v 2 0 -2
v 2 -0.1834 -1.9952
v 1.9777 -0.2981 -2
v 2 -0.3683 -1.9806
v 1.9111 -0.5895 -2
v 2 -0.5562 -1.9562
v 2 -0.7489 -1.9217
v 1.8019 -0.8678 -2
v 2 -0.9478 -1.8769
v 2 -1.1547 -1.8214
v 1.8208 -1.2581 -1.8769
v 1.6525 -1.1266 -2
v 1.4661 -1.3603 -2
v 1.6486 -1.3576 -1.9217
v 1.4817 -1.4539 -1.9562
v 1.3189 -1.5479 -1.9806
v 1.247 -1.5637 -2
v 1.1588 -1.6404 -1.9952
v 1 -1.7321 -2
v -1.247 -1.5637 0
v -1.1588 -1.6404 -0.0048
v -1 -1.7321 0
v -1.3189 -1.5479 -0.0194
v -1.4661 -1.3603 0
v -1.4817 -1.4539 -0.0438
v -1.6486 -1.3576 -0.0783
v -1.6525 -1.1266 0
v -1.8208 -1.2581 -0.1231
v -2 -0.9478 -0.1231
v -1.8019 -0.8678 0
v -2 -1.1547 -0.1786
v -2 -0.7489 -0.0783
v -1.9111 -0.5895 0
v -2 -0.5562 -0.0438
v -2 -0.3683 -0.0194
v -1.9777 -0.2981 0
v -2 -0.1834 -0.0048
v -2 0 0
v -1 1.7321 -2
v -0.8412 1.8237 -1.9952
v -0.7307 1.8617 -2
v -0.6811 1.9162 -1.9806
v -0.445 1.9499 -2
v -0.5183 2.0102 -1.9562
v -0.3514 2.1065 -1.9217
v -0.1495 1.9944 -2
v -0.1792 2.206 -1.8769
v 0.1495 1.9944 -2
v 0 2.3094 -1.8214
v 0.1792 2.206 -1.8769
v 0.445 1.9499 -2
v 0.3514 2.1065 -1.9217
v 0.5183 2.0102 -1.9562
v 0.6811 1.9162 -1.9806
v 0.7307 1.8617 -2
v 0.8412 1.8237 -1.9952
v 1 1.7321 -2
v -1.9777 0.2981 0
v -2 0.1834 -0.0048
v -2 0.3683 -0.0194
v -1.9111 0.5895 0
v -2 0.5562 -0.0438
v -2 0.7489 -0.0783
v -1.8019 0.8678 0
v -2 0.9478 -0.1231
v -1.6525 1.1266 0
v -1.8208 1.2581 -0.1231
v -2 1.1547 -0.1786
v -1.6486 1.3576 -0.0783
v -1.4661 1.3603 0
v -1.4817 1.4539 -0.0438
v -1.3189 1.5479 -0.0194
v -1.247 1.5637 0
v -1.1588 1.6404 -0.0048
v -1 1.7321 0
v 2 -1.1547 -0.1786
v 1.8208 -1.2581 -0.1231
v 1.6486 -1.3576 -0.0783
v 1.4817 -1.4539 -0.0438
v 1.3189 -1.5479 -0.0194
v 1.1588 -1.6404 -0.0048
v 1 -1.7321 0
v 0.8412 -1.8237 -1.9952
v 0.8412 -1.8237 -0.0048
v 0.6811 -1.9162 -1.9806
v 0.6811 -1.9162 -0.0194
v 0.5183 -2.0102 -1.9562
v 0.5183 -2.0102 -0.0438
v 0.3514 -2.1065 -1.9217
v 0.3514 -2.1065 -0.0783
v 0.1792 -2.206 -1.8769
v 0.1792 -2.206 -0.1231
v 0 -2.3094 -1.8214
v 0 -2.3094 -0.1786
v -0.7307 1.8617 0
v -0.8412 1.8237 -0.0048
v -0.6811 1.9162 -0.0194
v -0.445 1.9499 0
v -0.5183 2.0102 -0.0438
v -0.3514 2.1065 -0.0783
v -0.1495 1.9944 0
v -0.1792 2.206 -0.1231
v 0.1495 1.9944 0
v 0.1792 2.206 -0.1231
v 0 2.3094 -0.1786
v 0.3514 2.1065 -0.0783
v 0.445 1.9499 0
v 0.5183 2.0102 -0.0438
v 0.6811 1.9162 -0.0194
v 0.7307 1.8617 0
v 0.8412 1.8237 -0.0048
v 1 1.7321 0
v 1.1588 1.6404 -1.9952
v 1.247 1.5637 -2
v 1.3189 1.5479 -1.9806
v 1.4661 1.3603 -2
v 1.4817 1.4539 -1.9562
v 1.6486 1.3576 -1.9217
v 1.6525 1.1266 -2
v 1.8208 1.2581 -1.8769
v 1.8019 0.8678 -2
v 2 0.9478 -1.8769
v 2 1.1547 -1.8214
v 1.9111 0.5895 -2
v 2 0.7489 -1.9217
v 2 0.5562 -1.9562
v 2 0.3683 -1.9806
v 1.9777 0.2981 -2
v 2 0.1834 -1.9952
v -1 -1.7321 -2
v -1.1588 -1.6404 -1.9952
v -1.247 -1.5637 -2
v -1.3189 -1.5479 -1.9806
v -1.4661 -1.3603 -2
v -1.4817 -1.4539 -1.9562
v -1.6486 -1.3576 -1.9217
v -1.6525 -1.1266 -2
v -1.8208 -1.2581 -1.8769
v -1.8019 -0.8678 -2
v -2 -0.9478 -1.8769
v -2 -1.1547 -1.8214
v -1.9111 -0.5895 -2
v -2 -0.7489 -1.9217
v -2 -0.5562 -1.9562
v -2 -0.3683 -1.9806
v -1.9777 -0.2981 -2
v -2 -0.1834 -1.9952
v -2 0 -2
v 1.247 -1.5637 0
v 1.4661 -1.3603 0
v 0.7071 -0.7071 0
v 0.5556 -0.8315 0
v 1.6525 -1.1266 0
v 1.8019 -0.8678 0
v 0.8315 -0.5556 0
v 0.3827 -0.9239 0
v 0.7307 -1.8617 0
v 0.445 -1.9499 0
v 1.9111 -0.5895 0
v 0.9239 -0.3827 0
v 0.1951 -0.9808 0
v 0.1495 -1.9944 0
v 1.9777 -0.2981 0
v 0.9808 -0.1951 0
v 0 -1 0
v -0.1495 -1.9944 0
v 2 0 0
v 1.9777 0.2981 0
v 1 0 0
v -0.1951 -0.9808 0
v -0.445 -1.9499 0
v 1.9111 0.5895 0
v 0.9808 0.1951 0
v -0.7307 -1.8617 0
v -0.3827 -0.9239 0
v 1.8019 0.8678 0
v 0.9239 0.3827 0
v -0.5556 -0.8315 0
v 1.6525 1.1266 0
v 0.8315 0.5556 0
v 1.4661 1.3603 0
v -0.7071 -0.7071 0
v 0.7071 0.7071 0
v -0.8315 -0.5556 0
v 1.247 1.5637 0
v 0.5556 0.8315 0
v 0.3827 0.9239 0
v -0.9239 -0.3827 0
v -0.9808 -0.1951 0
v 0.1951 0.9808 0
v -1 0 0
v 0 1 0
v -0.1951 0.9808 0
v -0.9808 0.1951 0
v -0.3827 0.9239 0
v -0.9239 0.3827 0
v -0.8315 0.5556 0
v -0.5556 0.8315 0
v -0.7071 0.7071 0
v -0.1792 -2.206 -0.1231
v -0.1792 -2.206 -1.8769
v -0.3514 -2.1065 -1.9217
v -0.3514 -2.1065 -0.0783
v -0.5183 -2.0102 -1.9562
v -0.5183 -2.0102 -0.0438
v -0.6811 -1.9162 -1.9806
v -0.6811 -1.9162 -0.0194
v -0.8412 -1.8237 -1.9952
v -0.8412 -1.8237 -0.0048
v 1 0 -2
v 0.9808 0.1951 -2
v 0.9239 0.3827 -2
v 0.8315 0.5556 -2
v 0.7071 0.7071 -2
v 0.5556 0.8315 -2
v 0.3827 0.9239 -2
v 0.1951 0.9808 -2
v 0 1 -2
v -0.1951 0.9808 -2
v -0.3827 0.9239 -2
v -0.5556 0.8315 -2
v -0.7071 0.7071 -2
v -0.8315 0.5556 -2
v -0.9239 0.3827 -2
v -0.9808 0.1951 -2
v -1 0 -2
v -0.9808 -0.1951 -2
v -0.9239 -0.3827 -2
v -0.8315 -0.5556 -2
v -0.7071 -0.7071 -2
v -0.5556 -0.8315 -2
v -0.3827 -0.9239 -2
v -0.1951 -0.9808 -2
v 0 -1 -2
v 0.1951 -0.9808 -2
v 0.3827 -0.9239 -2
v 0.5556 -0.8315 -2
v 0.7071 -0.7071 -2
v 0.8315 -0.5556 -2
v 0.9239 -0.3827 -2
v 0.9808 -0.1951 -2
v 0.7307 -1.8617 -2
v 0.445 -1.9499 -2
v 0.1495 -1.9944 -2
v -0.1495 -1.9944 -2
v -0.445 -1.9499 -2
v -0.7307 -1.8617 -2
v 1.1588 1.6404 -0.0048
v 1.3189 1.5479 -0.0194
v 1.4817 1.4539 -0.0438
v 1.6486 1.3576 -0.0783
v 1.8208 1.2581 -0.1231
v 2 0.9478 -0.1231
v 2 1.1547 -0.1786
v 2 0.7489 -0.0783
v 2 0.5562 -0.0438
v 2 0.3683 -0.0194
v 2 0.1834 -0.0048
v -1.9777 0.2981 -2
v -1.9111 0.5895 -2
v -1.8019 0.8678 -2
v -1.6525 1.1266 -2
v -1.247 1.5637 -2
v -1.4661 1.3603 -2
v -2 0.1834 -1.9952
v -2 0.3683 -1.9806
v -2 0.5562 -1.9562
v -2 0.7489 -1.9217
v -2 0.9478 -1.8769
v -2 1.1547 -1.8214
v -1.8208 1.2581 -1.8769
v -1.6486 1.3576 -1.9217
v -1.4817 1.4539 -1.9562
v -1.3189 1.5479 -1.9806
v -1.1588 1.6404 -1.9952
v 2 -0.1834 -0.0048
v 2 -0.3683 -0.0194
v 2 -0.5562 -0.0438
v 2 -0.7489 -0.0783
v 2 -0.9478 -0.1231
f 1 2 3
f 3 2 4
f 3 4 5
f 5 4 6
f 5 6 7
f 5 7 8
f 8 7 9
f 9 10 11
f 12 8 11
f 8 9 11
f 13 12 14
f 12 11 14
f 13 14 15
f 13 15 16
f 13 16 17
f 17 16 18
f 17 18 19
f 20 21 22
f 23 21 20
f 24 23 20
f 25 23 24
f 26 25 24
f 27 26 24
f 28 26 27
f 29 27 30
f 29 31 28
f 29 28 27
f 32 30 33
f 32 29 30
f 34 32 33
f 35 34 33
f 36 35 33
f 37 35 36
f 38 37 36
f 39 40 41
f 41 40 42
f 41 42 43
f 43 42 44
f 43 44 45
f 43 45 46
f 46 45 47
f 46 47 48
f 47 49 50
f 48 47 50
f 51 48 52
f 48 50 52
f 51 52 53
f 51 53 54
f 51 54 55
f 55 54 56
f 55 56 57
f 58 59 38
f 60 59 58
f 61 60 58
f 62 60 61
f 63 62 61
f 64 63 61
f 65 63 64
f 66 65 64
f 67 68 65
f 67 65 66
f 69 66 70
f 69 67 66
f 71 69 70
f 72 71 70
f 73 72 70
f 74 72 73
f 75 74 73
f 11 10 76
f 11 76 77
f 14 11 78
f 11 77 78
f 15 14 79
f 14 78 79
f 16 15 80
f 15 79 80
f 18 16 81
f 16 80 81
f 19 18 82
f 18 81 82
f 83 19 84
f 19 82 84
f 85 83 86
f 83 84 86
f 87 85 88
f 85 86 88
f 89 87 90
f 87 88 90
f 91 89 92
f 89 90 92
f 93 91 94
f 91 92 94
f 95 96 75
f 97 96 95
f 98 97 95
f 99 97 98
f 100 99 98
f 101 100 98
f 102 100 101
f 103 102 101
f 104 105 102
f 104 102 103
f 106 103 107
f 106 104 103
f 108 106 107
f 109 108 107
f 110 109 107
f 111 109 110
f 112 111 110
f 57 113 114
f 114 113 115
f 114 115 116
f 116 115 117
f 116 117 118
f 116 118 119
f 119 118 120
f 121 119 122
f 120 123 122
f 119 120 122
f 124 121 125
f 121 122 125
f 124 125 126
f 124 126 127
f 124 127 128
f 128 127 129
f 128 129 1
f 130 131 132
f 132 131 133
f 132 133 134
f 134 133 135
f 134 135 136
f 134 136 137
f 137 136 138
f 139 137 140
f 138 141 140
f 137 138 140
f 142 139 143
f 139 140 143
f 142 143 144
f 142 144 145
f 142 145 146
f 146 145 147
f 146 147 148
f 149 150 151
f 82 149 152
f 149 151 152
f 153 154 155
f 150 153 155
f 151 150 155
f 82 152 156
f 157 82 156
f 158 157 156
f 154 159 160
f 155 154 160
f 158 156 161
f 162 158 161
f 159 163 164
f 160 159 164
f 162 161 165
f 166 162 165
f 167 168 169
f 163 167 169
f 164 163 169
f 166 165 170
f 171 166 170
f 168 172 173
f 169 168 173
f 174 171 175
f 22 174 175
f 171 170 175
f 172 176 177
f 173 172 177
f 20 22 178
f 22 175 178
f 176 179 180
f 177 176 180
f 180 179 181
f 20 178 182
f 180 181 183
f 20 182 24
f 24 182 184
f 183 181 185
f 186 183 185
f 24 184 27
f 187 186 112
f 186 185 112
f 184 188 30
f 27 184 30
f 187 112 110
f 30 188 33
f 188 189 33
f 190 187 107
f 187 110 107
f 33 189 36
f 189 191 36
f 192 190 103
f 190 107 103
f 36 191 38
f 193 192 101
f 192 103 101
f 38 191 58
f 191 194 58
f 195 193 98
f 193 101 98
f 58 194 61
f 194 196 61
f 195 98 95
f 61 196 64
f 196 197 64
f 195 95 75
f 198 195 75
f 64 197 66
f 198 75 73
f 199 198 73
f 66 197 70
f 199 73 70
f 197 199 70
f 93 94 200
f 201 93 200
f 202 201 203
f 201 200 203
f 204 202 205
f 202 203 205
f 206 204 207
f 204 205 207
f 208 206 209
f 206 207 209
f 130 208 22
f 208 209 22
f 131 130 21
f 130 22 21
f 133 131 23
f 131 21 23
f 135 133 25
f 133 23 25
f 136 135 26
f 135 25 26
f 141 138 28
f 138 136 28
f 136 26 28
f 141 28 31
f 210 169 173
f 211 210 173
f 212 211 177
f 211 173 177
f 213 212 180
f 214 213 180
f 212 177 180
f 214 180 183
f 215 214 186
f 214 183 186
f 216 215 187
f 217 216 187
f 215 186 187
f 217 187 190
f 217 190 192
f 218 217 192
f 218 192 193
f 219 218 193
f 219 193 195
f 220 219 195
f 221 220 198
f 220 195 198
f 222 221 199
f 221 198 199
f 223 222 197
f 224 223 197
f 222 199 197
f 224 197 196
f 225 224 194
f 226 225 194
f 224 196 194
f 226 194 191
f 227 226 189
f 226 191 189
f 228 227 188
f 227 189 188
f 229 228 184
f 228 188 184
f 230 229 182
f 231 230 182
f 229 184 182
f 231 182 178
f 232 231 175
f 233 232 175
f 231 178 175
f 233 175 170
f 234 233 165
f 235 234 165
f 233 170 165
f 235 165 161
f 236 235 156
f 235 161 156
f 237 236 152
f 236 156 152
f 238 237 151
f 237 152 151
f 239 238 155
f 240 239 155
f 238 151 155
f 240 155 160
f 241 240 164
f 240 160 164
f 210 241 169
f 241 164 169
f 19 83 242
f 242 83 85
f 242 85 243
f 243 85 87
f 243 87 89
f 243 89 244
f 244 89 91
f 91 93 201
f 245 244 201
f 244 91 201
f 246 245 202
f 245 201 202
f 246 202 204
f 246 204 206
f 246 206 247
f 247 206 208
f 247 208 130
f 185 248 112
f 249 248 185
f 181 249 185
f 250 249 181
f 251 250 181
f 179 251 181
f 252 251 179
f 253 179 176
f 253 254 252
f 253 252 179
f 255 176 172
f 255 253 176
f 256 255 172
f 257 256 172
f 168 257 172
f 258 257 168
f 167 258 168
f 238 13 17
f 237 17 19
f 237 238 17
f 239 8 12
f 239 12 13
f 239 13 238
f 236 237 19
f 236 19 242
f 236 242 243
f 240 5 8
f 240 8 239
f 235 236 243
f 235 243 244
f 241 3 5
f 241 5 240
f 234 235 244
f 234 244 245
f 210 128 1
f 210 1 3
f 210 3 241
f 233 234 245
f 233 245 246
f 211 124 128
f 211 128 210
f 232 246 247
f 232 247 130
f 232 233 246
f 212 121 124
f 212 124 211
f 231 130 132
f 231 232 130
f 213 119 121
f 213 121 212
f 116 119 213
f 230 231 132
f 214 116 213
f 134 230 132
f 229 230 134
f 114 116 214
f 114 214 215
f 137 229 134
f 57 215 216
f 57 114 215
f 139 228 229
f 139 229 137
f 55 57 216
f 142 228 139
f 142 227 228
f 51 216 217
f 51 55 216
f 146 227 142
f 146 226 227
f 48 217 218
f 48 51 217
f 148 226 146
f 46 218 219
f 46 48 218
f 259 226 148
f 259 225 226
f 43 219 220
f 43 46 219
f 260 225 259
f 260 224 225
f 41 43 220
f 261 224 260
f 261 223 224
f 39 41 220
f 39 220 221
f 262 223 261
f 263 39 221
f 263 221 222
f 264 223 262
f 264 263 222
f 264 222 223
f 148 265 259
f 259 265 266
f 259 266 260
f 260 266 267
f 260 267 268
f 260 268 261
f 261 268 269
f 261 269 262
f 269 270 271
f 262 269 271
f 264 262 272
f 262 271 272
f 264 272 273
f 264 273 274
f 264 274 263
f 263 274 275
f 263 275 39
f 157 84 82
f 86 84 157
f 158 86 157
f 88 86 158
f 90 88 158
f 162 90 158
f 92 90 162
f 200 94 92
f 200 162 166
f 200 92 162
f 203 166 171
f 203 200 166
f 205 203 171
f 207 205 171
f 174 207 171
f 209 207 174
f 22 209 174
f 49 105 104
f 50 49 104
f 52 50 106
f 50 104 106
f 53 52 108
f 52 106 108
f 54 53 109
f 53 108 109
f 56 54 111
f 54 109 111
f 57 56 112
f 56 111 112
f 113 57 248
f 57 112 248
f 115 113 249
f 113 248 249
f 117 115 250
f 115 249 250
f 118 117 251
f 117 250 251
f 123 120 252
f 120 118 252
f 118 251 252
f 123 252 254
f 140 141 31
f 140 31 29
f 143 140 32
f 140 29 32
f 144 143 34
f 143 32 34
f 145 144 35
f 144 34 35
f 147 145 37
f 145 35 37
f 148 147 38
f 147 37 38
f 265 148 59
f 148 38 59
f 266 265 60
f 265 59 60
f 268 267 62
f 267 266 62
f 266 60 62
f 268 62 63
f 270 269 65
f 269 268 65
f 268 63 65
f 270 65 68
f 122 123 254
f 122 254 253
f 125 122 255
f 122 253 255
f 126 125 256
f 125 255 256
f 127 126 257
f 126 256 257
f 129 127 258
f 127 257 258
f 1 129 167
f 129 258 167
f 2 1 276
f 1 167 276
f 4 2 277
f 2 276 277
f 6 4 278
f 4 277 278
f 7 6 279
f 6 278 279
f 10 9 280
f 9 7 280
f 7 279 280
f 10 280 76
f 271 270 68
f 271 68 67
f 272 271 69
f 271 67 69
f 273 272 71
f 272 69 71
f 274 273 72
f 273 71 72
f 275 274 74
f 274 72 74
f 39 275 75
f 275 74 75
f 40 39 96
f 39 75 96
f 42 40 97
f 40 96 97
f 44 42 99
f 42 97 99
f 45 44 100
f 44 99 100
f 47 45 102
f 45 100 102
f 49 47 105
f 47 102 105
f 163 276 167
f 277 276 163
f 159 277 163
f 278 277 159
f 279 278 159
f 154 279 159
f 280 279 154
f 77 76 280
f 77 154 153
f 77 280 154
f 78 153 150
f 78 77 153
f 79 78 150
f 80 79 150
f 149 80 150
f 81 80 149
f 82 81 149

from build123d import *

# Parameters (mm, degrees)
BASENUTSKE_R  = 1
BASENUT_DEPTH = 2


with BuildPart() as part:
    # BaseNutSke → BaseNut (new body)
    with BuildSketch(Plane.XY):
        Polygon((2, 1.154700538), (2, -1.154700538), (0, -2.309401077), (-2, -1.154700538), (-2, 1.154700538), (0, 2.309401077), align=None)
        Circle(BASENUTSKE_R, mode=Mode.SUBTRACT)
    extrude(amount=-BASENUT_DEPTH)

    # Sketch3 → Double-Chamfer (revolve, cut)
    with BuildSketch(Plane(origin=(0, 0, 0), x_dir=(0, 0, -1), z_dir=(1, 0, 0))):
        Polygon((2, 2), (1.821367205, 2.309401077), (1.821367205, 12.309401077), (12, 12.309401077), (12, 2), align=None)
        Polygon((0.178632795, 12.309401077), (-10, 12.309401077), (-10, 2), (0, 2), (0.178632795, 2.309401077), align=None)
    revolve(axis=Axis((0, 0, 0), (0, 0, -1)), mode=Mode.SUBTRACT)


solid = part.part
